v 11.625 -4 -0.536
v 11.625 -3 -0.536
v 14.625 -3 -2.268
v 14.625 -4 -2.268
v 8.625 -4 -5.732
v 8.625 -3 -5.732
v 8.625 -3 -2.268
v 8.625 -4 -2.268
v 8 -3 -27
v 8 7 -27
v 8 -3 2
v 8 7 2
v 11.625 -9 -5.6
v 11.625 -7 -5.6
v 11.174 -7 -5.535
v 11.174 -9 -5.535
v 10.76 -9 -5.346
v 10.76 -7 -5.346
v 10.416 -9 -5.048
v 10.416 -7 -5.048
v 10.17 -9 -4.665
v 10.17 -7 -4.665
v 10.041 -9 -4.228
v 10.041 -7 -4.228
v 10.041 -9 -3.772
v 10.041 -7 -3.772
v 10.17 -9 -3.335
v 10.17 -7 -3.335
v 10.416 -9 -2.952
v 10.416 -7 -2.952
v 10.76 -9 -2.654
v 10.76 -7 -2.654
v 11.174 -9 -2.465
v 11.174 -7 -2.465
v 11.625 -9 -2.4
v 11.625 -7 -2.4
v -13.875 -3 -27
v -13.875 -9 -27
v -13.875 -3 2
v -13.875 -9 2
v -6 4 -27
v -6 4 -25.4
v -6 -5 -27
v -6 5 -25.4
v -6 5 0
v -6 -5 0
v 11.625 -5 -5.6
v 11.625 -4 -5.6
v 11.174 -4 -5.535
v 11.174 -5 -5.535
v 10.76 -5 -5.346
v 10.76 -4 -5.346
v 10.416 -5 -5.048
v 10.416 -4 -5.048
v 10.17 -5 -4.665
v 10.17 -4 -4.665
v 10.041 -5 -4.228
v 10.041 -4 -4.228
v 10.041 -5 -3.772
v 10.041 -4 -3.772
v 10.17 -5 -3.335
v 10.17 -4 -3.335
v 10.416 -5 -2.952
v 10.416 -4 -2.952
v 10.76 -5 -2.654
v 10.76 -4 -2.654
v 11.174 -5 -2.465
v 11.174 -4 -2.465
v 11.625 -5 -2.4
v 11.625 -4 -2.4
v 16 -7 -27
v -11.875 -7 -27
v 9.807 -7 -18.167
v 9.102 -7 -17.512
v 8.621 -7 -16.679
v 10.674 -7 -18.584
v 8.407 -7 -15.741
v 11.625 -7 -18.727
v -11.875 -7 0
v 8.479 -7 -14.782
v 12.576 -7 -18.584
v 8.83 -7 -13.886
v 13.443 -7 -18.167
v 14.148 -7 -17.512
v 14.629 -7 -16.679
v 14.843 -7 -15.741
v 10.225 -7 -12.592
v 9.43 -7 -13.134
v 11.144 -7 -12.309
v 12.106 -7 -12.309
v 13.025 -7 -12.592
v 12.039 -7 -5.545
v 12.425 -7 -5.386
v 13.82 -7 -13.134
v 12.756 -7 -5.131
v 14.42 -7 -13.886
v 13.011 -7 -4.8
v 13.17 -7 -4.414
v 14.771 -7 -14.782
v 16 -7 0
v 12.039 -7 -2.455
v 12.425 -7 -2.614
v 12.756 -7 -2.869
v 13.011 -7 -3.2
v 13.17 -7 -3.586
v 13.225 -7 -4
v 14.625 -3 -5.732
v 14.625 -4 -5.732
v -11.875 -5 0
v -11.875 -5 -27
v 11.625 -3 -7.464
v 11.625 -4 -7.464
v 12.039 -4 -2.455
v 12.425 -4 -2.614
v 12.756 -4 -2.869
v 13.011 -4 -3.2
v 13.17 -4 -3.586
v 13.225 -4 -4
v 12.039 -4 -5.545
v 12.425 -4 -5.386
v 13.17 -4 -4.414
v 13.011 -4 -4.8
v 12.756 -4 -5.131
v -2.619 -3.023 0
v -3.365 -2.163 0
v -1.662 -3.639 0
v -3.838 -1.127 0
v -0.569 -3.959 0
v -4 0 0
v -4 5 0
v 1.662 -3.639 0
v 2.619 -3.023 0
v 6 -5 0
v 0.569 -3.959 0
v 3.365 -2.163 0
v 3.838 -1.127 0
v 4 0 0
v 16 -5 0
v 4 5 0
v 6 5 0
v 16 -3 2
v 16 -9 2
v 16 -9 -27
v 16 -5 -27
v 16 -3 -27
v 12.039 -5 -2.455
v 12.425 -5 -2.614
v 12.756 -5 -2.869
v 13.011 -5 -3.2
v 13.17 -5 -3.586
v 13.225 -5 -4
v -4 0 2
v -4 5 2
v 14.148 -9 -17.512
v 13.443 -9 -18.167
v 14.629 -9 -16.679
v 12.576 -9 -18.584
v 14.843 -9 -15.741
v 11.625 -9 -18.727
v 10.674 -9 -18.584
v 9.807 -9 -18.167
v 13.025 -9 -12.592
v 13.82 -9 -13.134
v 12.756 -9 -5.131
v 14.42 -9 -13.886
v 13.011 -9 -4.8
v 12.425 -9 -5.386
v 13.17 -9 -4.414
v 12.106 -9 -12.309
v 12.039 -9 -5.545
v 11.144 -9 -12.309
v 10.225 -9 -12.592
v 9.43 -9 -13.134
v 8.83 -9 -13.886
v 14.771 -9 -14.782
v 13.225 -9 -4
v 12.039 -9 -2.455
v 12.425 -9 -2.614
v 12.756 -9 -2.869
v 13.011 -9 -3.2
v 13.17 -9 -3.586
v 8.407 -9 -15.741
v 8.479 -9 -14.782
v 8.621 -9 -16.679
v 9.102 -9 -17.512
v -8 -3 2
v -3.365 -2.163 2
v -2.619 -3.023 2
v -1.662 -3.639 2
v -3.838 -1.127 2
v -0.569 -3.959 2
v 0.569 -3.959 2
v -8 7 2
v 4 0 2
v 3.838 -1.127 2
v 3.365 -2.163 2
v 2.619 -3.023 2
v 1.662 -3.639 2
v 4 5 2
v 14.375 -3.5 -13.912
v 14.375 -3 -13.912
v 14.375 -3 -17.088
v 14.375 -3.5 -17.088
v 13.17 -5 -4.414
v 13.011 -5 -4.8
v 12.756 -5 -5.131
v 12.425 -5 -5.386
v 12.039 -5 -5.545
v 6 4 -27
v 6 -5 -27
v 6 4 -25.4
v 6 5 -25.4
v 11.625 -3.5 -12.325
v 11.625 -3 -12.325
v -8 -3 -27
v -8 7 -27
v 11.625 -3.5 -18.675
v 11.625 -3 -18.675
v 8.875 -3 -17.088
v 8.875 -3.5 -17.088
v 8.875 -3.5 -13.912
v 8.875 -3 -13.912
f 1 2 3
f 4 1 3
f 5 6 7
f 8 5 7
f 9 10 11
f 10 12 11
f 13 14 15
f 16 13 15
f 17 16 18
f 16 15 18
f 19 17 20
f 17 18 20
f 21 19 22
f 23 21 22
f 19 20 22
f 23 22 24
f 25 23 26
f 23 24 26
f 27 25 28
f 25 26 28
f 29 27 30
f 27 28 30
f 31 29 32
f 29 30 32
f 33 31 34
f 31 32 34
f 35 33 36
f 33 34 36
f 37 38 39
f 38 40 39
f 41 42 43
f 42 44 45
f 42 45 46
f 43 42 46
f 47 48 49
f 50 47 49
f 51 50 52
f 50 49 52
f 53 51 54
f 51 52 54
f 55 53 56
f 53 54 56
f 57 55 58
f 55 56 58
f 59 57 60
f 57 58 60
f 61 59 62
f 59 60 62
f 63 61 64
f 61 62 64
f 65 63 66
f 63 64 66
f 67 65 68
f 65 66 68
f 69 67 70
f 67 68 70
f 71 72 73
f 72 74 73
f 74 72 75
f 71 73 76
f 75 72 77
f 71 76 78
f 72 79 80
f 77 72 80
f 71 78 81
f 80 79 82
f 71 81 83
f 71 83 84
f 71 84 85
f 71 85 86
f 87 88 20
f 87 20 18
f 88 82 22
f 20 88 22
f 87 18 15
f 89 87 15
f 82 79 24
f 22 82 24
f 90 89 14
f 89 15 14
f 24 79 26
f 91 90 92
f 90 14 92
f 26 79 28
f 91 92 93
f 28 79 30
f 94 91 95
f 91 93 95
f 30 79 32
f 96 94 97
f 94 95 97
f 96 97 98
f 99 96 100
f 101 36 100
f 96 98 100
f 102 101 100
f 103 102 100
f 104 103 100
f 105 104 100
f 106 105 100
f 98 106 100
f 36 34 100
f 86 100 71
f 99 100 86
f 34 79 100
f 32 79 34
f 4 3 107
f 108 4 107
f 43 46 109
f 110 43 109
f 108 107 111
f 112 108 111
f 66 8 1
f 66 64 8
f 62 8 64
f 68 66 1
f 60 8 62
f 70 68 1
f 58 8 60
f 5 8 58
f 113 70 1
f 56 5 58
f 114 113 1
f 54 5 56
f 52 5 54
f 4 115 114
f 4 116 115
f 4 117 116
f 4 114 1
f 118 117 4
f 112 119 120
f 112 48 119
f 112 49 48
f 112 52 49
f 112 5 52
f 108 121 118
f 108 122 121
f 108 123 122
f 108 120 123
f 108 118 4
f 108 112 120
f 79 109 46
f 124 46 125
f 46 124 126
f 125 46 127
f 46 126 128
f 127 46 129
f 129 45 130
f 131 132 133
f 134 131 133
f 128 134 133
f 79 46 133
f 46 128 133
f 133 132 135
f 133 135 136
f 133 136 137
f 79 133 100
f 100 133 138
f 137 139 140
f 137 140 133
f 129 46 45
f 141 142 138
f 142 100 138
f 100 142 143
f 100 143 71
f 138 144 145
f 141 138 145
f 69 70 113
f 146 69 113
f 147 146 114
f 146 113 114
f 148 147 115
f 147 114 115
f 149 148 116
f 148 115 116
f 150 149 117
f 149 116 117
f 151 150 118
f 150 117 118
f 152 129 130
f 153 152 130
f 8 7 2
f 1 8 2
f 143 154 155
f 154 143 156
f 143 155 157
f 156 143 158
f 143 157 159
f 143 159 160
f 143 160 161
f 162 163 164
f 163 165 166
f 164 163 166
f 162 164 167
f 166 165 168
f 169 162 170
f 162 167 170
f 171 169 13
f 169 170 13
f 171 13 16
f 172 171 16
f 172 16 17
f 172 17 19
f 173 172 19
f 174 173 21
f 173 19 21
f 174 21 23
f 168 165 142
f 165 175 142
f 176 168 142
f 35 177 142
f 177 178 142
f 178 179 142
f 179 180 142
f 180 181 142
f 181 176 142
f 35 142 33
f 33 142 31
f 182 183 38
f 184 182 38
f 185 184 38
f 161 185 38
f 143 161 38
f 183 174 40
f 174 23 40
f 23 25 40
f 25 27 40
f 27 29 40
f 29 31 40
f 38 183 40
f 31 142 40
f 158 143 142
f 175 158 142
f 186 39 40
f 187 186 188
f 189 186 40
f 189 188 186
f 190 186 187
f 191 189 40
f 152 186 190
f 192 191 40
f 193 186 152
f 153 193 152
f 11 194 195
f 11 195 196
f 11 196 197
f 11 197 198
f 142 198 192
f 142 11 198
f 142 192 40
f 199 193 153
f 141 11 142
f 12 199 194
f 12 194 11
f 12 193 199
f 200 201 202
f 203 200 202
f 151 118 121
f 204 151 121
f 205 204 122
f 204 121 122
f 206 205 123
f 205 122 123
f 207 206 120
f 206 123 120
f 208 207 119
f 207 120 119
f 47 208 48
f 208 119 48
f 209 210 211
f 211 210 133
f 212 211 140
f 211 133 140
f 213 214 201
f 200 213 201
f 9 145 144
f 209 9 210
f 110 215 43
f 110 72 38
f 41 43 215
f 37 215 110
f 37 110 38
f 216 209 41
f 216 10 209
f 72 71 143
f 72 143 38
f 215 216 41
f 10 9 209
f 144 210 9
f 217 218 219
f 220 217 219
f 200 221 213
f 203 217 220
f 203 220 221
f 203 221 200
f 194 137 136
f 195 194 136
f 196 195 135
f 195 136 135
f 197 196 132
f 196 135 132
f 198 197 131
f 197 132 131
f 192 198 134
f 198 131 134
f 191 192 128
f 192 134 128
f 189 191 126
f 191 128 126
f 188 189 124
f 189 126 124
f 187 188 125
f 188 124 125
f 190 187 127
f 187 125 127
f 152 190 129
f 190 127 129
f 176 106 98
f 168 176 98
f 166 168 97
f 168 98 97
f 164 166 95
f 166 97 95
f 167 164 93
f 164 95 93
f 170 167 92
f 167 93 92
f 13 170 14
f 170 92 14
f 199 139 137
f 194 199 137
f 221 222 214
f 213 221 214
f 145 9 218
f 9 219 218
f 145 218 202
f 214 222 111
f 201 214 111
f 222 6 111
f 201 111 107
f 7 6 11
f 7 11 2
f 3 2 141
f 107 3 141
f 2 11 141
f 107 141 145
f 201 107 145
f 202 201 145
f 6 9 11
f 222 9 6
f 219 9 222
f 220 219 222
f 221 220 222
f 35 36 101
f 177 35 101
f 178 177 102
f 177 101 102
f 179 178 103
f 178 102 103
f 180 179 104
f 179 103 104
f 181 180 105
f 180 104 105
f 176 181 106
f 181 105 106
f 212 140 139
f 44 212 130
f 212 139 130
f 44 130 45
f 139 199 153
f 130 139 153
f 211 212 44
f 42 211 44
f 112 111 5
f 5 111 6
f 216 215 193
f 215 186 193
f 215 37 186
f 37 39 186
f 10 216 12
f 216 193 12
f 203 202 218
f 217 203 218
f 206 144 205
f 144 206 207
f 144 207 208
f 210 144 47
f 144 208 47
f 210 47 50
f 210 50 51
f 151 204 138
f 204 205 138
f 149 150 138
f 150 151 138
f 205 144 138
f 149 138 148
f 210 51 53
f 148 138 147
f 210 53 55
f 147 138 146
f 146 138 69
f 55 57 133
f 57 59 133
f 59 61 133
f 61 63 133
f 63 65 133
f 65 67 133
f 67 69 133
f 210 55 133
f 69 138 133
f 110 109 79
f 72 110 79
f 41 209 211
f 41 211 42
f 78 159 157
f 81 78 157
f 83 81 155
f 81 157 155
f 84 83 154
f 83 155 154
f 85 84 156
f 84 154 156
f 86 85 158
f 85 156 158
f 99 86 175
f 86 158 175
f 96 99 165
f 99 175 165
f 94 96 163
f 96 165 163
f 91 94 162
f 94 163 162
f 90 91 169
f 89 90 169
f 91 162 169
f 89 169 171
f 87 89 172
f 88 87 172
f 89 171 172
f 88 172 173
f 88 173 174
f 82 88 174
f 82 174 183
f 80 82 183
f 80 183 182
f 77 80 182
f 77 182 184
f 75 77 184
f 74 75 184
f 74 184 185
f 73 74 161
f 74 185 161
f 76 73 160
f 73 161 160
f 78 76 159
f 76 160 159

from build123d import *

# Parameters (mm, degrees)
EXTRUDE_1_DEPTH     = 2
EXTRUDE_2_DEPTH     = 27
SKETCH_4_R          = 3.227350269
CUT_EXTRUDE_1_DEPTH = 2
CUT_EXTRUDE_2_DEPTH = 0.5
CUT_EXTRUDE_3_DEPTH = 1
CUT_EXTRUDE_4_DEPTH = 34.256578297
SKETCH_8_W          = 12
SKETCH_8_H          = 1
EXTRUDE_3_DEPTH     = 1.6


with BuildPart() as part:
    # 草图1 → 凸台-拉伸1 (new body)
    with BuildSketch(Plane.XY):
        with BuildLine():
            Line((-5.5, -5), (5.5, -5))
            ThreePointArc((5.5, -5), (5.853553391, -4.853553391), (6, -4.5))
            Line((6, -4.5), (6, 4.5))
            ThreePointArc((6, 4.5), (5.853553391, 4.853553391), (5.5, 5))
            Line((5.5, 5), (4, 5))
            Line((4, 5), (4, 0))
            ThreePointArc((4, 0), (0, -4), (-4, 0))
            Line((-4, 0), (-4, 5))
            Line((-4, 5), (-5.5, 5))
            ThreePointArc((-5.5, 5), (-5.853553391, 4.853553391), (-6, 4.5))
            Line((-6, 4.5), (-6, -4.5))
            ThreePointArc((-6, -4.5), (-5.853553391, -4.853553391), (-5.5, -5))
        make_face()
        with BuildLine():
            Line((-8, -3), (-13.875, -3))
            Line((-13.875, -3), (-13.875, -9))
            Line((-13.875, -9), (16, -9))
            Line((16, -9), (16, -7))
            Line((16, -7), (-11.875, -7))
            Line((-11.875, -7), (-11.875, -5))
            Line((-11.875, -5), (-8, -5))
            Line((-8, -5), (-5.5, -5))
            ThreePointArc((-5.5, -5), (-5.853553391, -4.853553391), (-6, -4.5))
            Line((-6, -4.5), (-6, 4.5))
            ThreePointArc((-6, 4.5), (-5.853553391, 4.853553391), (-5.5, 5))
            Line((-5.5, 5), (-4, 5))
            Line((-4, 5), (4, 5))
            Line((4, 5), (5.5, 5))
            ThreePointArc((5.5, 5), (5.853553391, 4.853553391), (6, 4.5))
            Line((6, 4.5), (6, -4.5))
            ThreePointArc((6, -4.5), (5.853553391, -4.853553391), (5.5, -5))
            Line((5.5, -5), (8, -5))
            Line((8, -5), (16, -5))
            Line((16, -5), (16, -3))
            Line((16, -3), (8, -3))
            Line((8, -3), (8, 7))
            Line((8, 7), (-8, 7))
            Line((-8, 7), (-8, -3))
        make_face()
        Polygon((-11.875, -7), (16, -7), (16, -5), (8, -5), (5.5, -5), (-5.5, -5), (-8, -5), (-11.875, -5), align=None)
    extrude(amount=EXTRUDE_1_DEPTH)

    # 草图2 → 凸台-拉伸2 (add)
    with BuildSketch(Plane(origin=(0, 0, 0), x_dir=(-1, 0, 0), z_dir=(0, 0, -1))):
        Polygon((-6, 4.5), (-6, 5), (-5.5, 5), (5.5, 5), (6, 5), (6, 4.5), (6, -4.5), (6, -5), (11.875, -5), (11.875, -7), (-16, -7), (-16, -9), (13.875, -9), (13.875, -3), (8, -3), (8, 7), (-8, 7), (-8, -3), (-16, -3), (-16, -5), (-6, -5), (-6, -4.5), align=None)
    extrude(amount=EXTRUDE_2_DEPTH)

    # 草图4 → 切除-拉伸1 (cut)
    with BuildSketch(Plane.XZ.offset(9)):
        with Locations(Location((11.625, -15.5, 0), (0, 0, 270))):
            Circle(SKETCH_4_R)
    extrude(amount=-CUT_EXTRUDE_1_DEPTH, mode=Mode.SUBTRACT)

    # 草图5 → 切除-拉伸2 (cut)
    with BuildSketch(Plane(origin=(0, -3, 0), x_dir=(1, 0, 0), z_dir=(0, 1, 0))):
        Polygon((11.625, 18.675426481), (8.875, 17.08771324), (8.875, 13.91228676), (11.625, 12.324573519), (14.375, 13.91228676), (14.375, 17.08771324), align=None)
    extrude(amount=-CUT_EXTRUDE_2_DEPTH, mode=Mode.SUBTRACT)

    # 草图6 → 切除-拉伸3 (cut)
    with BuildSketch(Plane(origin=(0, -3, 0), x_dir=(1, 0, 0), z_dir=(0, 1, 0))):
        Polygon((8.625, 2.267949192), (11.625, 0.535898385), (14.625, 2.267949192), (14.625, 5.732050808), (11.625, 7.464101615), (8.625, 5.732050808), align=None)
    extrude(amount=-CUT_EXTRUDE_3_DEPTH, mode=Mode.SUBTRACT)

    # 草图7 → 切除-拉伸4 (cut, through all)
    with BuildSketch(Plane(origin=(0, -4, 0), x_dir=(1, 0, 0), z_dir=(0, 1, 0))):
        with BuildLine():
            ThreePointArc((13.225, 4), (12.75637085, 5.13137085), (11.625, 5.6))
            Line((11.625, 5.6), (11.625, 2.4))
            ThreePointArc((11.625, 2.4), (12.75637085, 2.86862915), (13.225, 4))
        make_face()
        with BuildLine():
            Line((11.625, 2.4), (11.625, 5.6))
            ThreePointArc((11.625, 5.6), (10.025, 4), (11.625, 2.4))
        make_face()
    extrude(amount=-CUT_EXTRUDE_4_DEPTH, mode=Mode.SUBTRACT)

    # 草图8 → 凸台-拉伸3 (add)
    with BuildSketch(Plane(origin=(0, 0, -27), x_dir=(-1, 0, 0), z_dir=(0, 0, -1))):
        with Locations((0, 4.5)):
            Rectangle(SKETCH_8_W, SKETCH_8_H)
    extrude(amount=-EXTRUDE_3_DEPTH)


solid = part.part
